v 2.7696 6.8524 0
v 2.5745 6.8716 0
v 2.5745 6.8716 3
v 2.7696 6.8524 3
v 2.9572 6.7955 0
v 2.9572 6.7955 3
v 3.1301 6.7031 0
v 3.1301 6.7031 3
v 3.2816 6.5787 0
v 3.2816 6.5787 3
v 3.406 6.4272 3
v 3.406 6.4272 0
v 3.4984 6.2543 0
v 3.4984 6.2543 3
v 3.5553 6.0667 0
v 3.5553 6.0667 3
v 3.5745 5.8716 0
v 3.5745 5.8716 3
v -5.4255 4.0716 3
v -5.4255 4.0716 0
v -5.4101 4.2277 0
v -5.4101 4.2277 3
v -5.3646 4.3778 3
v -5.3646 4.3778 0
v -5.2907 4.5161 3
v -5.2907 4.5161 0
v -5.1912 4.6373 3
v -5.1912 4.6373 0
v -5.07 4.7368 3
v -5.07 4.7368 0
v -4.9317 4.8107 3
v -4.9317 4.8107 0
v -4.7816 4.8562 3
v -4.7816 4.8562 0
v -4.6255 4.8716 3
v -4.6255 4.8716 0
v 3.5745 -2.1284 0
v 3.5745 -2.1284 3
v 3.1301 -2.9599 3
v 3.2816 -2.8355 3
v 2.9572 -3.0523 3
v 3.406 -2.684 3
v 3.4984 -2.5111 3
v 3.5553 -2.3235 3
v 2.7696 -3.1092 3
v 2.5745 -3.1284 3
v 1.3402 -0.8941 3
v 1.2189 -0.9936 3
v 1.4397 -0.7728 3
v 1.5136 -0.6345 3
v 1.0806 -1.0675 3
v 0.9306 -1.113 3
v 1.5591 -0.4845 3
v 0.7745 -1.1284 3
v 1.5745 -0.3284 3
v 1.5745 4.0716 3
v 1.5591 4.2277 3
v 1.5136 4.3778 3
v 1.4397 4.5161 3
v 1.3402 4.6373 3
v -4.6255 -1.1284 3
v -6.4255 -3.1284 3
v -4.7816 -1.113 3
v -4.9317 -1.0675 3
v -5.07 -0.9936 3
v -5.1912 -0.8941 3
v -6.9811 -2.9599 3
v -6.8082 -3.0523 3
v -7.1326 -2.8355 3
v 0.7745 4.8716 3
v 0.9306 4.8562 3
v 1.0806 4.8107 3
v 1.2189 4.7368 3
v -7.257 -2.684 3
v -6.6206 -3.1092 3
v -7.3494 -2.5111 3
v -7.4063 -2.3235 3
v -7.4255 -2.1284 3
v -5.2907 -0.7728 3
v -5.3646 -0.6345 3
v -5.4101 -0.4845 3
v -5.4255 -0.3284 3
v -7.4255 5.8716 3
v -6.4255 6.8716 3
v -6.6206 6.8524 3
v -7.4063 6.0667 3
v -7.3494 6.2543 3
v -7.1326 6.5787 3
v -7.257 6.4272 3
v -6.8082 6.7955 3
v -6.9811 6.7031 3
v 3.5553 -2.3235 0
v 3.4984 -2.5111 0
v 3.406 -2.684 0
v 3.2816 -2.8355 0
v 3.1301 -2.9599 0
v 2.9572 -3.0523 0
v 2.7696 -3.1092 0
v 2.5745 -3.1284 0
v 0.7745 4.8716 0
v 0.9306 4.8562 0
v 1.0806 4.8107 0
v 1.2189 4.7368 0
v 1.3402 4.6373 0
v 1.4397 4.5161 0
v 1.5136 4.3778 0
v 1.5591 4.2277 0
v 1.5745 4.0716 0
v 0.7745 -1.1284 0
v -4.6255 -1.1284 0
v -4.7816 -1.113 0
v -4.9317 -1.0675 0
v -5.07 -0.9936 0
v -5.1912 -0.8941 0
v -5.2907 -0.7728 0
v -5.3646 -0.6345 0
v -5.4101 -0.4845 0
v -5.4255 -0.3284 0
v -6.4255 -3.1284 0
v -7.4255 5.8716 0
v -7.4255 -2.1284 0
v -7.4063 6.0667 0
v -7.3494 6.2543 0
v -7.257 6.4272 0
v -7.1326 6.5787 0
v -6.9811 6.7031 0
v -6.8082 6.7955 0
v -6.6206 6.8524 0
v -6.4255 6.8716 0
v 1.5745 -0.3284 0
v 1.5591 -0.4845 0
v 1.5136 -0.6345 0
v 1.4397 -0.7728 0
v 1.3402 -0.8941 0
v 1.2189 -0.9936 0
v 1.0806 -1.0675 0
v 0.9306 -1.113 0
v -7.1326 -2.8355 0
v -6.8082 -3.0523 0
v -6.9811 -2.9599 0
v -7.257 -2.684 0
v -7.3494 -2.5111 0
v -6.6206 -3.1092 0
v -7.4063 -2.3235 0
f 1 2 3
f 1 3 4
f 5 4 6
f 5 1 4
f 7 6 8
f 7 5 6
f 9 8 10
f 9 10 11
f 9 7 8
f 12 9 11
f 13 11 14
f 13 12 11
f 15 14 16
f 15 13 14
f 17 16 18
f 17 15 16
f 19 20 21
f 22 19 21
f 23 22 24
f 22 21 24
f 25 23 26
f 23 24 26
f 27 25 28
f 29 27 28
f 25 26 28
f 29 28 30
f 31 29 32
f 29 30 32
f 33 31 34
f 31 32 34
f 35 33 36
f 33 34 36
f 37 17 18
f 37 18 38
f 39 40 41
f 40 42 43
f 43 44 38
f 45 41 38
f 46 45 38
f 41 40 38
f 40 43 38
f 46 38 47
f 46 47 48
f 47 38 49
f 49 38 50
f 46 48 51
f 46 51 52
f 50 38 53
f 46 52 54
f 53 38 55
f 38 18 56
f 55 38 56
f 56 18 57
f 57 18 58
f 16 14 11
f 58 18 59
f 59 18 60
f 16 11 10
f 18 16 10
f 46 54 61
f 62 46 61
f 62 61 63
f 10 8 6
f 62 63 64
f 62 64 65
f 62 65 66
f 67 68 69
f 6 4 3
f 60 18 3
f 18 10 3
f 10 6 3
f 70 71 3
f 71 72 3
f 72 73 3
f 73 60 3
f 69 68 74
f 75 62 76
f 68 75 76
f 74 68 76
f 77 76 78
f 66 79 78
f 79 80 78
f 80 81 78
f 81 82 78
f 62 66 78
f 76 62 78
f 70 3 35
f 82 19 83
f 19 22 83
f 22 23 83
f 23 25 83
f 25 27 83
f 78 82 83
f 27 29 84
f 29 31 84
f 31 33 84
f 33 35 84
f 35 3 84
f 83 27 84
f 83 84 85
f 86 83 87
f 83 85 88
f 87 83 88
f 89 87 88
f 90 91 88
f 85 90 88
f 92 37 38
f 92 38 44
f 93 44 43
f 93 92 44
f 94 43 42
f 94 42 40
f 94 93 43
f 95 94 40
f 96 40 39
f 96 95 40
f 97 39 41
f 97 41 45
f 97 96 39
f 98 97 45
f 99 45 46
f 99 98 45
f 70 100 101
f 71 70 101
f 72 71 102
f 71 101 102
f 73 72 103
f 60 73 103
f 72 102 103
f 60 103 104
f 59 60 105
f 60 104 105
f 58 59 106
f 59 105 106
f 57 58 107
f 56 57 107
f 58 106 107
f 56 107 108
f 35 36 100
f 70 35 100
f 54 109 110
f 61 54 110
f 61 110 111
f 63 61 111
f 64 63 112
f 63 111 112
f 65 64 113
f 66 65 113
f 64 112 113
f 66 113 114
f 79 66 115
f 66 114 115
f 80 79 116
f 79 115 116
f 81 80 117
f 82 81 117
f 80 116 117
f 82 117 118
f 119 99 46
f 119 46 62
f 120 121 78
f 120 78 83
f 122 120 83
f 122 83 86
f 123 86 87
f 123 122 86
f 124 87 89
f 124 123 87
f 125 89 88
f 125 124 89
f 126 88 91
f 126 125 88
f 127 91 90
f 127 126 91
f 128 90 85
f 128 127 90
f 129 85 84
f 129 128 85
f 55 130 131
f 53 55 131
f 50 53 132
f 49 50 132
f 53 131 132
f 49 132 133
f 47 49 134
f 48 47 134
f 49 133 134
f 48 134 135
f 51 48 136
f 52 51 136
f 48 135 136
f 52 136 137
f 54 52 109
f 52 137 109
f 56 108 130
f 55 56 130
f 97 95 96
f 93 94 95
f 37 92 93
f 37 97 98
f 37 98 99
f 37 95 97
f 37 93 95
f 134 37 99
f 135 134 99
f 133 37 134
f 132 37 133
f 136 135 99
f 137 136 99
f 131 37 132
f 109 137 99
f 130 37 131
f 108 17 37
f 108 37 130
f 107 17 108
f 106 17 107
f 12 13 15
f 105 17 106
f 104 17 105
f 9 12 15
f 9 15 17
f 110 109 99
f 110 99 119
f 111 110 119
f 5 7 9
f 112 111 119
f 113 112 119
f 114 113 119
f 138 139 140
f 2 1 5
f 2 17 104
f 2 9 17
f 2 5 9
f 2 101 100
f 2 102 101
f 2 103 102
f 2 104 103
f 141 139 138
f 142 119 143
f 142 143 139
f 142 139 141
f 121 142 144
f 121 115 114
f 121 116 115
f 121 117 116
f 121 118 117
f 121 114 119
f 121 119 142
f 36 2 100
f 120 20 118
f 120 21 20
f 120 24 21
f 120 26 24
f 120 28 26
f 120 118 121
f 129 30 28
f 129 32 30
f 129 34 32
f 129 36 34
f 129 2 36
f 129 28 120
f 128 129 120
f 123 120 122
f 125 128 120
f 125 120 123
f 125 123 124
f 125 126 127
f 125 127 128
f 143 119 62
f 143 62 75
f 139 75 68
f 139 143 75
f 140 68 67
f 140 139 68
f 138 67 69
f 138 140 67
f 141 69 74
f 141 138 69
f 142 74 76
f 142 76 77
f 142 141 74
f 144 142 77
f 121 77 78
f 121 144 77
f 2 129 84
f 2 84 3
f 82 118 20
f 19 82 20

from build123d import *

# Parameters (mm, degrees)
EXTRUDE_1_DEPTH     = 3
CUT_EXTRUDE_1_DEPTH = 3


with BuildPart() as part:
    # 草图1 → 凸台-拉伸1 (new body)
    with BuildSketch(Plane.XY):
        with BuildLine():
            Line((-6.425519106, 6.87161757), (2.574480894, 6.87161757))
            ThreePointArc((2.574480894, 6.87161757), (3.281587675, 6.578724351), (3.574480894, 5.87161757))
            Line((3.574480894, 5.87161757), (3.574480894, -2.12838243))
            ThreePointArc((3.574480894, -2.12838243), (3.281587675, -2.835489211), (2.574480894, -3.12838243))
            Line((2.574480894, -3.12838243), (-6.425519106, -3.12838243))
            ThreePointArc((-6.425519106, -3.12838243), (-7.132625887, -2.835489211), (-7.425519106, -2.12838243))
            Line((-7.425519106, -2.12838243), (-7.425519106, 5.87161757))
            ThreePointArc((-7.425519106, 5.87161757), (-7.132625887, 6.578724351), (-6.425519106, 6.87161757))
        make_face()
    extrude(amount=EXTRUDE_1_DEPTH)

    # 草图3 → 切除-拉伸1 (cut)
    with BuildSketch(Plane(origin=(0, 0, 0), x_dir=(-1, 0, 0), z_dir=(0, 0, -1))):
        with BuildLine():
            Line((5.425519106, -0.32838243), (5.425519106, 4.07161757))
            ThreePointArc((5.425519106, 4.07161757), (5.191204531, 4.637302995), (4.625519106, 4.87161757))
            Line((4.625519106, 4.87161757), (-0.774480894, 4.87161757))
            ThreePointArc((-0.774480894, 4.87161757), (-1.340166319, 4.637302995), (-1.574480894, 4.07161757))
            Line((-1.574480894, 4.07161757), (-1.574480894, -0.32838243))
            ThreePointArc((-1.574480894, -0.32838243), (-1.340166319, -0.894067855), (-0.774480894, -1.12838243))
            Line((-0.774480894, -1.12838243), (4.625519106, -1.12838243))
            ThreePointArc((4.625519106, -1.12838243), (5.191204531, -0.894067855), (5.425519106, -0.32838243))
        make_face()
    extrude(amount=-CUT_EXTRUDE_1_DEPTH, mode=Mode.SUBTRACT)


solid = part.part
